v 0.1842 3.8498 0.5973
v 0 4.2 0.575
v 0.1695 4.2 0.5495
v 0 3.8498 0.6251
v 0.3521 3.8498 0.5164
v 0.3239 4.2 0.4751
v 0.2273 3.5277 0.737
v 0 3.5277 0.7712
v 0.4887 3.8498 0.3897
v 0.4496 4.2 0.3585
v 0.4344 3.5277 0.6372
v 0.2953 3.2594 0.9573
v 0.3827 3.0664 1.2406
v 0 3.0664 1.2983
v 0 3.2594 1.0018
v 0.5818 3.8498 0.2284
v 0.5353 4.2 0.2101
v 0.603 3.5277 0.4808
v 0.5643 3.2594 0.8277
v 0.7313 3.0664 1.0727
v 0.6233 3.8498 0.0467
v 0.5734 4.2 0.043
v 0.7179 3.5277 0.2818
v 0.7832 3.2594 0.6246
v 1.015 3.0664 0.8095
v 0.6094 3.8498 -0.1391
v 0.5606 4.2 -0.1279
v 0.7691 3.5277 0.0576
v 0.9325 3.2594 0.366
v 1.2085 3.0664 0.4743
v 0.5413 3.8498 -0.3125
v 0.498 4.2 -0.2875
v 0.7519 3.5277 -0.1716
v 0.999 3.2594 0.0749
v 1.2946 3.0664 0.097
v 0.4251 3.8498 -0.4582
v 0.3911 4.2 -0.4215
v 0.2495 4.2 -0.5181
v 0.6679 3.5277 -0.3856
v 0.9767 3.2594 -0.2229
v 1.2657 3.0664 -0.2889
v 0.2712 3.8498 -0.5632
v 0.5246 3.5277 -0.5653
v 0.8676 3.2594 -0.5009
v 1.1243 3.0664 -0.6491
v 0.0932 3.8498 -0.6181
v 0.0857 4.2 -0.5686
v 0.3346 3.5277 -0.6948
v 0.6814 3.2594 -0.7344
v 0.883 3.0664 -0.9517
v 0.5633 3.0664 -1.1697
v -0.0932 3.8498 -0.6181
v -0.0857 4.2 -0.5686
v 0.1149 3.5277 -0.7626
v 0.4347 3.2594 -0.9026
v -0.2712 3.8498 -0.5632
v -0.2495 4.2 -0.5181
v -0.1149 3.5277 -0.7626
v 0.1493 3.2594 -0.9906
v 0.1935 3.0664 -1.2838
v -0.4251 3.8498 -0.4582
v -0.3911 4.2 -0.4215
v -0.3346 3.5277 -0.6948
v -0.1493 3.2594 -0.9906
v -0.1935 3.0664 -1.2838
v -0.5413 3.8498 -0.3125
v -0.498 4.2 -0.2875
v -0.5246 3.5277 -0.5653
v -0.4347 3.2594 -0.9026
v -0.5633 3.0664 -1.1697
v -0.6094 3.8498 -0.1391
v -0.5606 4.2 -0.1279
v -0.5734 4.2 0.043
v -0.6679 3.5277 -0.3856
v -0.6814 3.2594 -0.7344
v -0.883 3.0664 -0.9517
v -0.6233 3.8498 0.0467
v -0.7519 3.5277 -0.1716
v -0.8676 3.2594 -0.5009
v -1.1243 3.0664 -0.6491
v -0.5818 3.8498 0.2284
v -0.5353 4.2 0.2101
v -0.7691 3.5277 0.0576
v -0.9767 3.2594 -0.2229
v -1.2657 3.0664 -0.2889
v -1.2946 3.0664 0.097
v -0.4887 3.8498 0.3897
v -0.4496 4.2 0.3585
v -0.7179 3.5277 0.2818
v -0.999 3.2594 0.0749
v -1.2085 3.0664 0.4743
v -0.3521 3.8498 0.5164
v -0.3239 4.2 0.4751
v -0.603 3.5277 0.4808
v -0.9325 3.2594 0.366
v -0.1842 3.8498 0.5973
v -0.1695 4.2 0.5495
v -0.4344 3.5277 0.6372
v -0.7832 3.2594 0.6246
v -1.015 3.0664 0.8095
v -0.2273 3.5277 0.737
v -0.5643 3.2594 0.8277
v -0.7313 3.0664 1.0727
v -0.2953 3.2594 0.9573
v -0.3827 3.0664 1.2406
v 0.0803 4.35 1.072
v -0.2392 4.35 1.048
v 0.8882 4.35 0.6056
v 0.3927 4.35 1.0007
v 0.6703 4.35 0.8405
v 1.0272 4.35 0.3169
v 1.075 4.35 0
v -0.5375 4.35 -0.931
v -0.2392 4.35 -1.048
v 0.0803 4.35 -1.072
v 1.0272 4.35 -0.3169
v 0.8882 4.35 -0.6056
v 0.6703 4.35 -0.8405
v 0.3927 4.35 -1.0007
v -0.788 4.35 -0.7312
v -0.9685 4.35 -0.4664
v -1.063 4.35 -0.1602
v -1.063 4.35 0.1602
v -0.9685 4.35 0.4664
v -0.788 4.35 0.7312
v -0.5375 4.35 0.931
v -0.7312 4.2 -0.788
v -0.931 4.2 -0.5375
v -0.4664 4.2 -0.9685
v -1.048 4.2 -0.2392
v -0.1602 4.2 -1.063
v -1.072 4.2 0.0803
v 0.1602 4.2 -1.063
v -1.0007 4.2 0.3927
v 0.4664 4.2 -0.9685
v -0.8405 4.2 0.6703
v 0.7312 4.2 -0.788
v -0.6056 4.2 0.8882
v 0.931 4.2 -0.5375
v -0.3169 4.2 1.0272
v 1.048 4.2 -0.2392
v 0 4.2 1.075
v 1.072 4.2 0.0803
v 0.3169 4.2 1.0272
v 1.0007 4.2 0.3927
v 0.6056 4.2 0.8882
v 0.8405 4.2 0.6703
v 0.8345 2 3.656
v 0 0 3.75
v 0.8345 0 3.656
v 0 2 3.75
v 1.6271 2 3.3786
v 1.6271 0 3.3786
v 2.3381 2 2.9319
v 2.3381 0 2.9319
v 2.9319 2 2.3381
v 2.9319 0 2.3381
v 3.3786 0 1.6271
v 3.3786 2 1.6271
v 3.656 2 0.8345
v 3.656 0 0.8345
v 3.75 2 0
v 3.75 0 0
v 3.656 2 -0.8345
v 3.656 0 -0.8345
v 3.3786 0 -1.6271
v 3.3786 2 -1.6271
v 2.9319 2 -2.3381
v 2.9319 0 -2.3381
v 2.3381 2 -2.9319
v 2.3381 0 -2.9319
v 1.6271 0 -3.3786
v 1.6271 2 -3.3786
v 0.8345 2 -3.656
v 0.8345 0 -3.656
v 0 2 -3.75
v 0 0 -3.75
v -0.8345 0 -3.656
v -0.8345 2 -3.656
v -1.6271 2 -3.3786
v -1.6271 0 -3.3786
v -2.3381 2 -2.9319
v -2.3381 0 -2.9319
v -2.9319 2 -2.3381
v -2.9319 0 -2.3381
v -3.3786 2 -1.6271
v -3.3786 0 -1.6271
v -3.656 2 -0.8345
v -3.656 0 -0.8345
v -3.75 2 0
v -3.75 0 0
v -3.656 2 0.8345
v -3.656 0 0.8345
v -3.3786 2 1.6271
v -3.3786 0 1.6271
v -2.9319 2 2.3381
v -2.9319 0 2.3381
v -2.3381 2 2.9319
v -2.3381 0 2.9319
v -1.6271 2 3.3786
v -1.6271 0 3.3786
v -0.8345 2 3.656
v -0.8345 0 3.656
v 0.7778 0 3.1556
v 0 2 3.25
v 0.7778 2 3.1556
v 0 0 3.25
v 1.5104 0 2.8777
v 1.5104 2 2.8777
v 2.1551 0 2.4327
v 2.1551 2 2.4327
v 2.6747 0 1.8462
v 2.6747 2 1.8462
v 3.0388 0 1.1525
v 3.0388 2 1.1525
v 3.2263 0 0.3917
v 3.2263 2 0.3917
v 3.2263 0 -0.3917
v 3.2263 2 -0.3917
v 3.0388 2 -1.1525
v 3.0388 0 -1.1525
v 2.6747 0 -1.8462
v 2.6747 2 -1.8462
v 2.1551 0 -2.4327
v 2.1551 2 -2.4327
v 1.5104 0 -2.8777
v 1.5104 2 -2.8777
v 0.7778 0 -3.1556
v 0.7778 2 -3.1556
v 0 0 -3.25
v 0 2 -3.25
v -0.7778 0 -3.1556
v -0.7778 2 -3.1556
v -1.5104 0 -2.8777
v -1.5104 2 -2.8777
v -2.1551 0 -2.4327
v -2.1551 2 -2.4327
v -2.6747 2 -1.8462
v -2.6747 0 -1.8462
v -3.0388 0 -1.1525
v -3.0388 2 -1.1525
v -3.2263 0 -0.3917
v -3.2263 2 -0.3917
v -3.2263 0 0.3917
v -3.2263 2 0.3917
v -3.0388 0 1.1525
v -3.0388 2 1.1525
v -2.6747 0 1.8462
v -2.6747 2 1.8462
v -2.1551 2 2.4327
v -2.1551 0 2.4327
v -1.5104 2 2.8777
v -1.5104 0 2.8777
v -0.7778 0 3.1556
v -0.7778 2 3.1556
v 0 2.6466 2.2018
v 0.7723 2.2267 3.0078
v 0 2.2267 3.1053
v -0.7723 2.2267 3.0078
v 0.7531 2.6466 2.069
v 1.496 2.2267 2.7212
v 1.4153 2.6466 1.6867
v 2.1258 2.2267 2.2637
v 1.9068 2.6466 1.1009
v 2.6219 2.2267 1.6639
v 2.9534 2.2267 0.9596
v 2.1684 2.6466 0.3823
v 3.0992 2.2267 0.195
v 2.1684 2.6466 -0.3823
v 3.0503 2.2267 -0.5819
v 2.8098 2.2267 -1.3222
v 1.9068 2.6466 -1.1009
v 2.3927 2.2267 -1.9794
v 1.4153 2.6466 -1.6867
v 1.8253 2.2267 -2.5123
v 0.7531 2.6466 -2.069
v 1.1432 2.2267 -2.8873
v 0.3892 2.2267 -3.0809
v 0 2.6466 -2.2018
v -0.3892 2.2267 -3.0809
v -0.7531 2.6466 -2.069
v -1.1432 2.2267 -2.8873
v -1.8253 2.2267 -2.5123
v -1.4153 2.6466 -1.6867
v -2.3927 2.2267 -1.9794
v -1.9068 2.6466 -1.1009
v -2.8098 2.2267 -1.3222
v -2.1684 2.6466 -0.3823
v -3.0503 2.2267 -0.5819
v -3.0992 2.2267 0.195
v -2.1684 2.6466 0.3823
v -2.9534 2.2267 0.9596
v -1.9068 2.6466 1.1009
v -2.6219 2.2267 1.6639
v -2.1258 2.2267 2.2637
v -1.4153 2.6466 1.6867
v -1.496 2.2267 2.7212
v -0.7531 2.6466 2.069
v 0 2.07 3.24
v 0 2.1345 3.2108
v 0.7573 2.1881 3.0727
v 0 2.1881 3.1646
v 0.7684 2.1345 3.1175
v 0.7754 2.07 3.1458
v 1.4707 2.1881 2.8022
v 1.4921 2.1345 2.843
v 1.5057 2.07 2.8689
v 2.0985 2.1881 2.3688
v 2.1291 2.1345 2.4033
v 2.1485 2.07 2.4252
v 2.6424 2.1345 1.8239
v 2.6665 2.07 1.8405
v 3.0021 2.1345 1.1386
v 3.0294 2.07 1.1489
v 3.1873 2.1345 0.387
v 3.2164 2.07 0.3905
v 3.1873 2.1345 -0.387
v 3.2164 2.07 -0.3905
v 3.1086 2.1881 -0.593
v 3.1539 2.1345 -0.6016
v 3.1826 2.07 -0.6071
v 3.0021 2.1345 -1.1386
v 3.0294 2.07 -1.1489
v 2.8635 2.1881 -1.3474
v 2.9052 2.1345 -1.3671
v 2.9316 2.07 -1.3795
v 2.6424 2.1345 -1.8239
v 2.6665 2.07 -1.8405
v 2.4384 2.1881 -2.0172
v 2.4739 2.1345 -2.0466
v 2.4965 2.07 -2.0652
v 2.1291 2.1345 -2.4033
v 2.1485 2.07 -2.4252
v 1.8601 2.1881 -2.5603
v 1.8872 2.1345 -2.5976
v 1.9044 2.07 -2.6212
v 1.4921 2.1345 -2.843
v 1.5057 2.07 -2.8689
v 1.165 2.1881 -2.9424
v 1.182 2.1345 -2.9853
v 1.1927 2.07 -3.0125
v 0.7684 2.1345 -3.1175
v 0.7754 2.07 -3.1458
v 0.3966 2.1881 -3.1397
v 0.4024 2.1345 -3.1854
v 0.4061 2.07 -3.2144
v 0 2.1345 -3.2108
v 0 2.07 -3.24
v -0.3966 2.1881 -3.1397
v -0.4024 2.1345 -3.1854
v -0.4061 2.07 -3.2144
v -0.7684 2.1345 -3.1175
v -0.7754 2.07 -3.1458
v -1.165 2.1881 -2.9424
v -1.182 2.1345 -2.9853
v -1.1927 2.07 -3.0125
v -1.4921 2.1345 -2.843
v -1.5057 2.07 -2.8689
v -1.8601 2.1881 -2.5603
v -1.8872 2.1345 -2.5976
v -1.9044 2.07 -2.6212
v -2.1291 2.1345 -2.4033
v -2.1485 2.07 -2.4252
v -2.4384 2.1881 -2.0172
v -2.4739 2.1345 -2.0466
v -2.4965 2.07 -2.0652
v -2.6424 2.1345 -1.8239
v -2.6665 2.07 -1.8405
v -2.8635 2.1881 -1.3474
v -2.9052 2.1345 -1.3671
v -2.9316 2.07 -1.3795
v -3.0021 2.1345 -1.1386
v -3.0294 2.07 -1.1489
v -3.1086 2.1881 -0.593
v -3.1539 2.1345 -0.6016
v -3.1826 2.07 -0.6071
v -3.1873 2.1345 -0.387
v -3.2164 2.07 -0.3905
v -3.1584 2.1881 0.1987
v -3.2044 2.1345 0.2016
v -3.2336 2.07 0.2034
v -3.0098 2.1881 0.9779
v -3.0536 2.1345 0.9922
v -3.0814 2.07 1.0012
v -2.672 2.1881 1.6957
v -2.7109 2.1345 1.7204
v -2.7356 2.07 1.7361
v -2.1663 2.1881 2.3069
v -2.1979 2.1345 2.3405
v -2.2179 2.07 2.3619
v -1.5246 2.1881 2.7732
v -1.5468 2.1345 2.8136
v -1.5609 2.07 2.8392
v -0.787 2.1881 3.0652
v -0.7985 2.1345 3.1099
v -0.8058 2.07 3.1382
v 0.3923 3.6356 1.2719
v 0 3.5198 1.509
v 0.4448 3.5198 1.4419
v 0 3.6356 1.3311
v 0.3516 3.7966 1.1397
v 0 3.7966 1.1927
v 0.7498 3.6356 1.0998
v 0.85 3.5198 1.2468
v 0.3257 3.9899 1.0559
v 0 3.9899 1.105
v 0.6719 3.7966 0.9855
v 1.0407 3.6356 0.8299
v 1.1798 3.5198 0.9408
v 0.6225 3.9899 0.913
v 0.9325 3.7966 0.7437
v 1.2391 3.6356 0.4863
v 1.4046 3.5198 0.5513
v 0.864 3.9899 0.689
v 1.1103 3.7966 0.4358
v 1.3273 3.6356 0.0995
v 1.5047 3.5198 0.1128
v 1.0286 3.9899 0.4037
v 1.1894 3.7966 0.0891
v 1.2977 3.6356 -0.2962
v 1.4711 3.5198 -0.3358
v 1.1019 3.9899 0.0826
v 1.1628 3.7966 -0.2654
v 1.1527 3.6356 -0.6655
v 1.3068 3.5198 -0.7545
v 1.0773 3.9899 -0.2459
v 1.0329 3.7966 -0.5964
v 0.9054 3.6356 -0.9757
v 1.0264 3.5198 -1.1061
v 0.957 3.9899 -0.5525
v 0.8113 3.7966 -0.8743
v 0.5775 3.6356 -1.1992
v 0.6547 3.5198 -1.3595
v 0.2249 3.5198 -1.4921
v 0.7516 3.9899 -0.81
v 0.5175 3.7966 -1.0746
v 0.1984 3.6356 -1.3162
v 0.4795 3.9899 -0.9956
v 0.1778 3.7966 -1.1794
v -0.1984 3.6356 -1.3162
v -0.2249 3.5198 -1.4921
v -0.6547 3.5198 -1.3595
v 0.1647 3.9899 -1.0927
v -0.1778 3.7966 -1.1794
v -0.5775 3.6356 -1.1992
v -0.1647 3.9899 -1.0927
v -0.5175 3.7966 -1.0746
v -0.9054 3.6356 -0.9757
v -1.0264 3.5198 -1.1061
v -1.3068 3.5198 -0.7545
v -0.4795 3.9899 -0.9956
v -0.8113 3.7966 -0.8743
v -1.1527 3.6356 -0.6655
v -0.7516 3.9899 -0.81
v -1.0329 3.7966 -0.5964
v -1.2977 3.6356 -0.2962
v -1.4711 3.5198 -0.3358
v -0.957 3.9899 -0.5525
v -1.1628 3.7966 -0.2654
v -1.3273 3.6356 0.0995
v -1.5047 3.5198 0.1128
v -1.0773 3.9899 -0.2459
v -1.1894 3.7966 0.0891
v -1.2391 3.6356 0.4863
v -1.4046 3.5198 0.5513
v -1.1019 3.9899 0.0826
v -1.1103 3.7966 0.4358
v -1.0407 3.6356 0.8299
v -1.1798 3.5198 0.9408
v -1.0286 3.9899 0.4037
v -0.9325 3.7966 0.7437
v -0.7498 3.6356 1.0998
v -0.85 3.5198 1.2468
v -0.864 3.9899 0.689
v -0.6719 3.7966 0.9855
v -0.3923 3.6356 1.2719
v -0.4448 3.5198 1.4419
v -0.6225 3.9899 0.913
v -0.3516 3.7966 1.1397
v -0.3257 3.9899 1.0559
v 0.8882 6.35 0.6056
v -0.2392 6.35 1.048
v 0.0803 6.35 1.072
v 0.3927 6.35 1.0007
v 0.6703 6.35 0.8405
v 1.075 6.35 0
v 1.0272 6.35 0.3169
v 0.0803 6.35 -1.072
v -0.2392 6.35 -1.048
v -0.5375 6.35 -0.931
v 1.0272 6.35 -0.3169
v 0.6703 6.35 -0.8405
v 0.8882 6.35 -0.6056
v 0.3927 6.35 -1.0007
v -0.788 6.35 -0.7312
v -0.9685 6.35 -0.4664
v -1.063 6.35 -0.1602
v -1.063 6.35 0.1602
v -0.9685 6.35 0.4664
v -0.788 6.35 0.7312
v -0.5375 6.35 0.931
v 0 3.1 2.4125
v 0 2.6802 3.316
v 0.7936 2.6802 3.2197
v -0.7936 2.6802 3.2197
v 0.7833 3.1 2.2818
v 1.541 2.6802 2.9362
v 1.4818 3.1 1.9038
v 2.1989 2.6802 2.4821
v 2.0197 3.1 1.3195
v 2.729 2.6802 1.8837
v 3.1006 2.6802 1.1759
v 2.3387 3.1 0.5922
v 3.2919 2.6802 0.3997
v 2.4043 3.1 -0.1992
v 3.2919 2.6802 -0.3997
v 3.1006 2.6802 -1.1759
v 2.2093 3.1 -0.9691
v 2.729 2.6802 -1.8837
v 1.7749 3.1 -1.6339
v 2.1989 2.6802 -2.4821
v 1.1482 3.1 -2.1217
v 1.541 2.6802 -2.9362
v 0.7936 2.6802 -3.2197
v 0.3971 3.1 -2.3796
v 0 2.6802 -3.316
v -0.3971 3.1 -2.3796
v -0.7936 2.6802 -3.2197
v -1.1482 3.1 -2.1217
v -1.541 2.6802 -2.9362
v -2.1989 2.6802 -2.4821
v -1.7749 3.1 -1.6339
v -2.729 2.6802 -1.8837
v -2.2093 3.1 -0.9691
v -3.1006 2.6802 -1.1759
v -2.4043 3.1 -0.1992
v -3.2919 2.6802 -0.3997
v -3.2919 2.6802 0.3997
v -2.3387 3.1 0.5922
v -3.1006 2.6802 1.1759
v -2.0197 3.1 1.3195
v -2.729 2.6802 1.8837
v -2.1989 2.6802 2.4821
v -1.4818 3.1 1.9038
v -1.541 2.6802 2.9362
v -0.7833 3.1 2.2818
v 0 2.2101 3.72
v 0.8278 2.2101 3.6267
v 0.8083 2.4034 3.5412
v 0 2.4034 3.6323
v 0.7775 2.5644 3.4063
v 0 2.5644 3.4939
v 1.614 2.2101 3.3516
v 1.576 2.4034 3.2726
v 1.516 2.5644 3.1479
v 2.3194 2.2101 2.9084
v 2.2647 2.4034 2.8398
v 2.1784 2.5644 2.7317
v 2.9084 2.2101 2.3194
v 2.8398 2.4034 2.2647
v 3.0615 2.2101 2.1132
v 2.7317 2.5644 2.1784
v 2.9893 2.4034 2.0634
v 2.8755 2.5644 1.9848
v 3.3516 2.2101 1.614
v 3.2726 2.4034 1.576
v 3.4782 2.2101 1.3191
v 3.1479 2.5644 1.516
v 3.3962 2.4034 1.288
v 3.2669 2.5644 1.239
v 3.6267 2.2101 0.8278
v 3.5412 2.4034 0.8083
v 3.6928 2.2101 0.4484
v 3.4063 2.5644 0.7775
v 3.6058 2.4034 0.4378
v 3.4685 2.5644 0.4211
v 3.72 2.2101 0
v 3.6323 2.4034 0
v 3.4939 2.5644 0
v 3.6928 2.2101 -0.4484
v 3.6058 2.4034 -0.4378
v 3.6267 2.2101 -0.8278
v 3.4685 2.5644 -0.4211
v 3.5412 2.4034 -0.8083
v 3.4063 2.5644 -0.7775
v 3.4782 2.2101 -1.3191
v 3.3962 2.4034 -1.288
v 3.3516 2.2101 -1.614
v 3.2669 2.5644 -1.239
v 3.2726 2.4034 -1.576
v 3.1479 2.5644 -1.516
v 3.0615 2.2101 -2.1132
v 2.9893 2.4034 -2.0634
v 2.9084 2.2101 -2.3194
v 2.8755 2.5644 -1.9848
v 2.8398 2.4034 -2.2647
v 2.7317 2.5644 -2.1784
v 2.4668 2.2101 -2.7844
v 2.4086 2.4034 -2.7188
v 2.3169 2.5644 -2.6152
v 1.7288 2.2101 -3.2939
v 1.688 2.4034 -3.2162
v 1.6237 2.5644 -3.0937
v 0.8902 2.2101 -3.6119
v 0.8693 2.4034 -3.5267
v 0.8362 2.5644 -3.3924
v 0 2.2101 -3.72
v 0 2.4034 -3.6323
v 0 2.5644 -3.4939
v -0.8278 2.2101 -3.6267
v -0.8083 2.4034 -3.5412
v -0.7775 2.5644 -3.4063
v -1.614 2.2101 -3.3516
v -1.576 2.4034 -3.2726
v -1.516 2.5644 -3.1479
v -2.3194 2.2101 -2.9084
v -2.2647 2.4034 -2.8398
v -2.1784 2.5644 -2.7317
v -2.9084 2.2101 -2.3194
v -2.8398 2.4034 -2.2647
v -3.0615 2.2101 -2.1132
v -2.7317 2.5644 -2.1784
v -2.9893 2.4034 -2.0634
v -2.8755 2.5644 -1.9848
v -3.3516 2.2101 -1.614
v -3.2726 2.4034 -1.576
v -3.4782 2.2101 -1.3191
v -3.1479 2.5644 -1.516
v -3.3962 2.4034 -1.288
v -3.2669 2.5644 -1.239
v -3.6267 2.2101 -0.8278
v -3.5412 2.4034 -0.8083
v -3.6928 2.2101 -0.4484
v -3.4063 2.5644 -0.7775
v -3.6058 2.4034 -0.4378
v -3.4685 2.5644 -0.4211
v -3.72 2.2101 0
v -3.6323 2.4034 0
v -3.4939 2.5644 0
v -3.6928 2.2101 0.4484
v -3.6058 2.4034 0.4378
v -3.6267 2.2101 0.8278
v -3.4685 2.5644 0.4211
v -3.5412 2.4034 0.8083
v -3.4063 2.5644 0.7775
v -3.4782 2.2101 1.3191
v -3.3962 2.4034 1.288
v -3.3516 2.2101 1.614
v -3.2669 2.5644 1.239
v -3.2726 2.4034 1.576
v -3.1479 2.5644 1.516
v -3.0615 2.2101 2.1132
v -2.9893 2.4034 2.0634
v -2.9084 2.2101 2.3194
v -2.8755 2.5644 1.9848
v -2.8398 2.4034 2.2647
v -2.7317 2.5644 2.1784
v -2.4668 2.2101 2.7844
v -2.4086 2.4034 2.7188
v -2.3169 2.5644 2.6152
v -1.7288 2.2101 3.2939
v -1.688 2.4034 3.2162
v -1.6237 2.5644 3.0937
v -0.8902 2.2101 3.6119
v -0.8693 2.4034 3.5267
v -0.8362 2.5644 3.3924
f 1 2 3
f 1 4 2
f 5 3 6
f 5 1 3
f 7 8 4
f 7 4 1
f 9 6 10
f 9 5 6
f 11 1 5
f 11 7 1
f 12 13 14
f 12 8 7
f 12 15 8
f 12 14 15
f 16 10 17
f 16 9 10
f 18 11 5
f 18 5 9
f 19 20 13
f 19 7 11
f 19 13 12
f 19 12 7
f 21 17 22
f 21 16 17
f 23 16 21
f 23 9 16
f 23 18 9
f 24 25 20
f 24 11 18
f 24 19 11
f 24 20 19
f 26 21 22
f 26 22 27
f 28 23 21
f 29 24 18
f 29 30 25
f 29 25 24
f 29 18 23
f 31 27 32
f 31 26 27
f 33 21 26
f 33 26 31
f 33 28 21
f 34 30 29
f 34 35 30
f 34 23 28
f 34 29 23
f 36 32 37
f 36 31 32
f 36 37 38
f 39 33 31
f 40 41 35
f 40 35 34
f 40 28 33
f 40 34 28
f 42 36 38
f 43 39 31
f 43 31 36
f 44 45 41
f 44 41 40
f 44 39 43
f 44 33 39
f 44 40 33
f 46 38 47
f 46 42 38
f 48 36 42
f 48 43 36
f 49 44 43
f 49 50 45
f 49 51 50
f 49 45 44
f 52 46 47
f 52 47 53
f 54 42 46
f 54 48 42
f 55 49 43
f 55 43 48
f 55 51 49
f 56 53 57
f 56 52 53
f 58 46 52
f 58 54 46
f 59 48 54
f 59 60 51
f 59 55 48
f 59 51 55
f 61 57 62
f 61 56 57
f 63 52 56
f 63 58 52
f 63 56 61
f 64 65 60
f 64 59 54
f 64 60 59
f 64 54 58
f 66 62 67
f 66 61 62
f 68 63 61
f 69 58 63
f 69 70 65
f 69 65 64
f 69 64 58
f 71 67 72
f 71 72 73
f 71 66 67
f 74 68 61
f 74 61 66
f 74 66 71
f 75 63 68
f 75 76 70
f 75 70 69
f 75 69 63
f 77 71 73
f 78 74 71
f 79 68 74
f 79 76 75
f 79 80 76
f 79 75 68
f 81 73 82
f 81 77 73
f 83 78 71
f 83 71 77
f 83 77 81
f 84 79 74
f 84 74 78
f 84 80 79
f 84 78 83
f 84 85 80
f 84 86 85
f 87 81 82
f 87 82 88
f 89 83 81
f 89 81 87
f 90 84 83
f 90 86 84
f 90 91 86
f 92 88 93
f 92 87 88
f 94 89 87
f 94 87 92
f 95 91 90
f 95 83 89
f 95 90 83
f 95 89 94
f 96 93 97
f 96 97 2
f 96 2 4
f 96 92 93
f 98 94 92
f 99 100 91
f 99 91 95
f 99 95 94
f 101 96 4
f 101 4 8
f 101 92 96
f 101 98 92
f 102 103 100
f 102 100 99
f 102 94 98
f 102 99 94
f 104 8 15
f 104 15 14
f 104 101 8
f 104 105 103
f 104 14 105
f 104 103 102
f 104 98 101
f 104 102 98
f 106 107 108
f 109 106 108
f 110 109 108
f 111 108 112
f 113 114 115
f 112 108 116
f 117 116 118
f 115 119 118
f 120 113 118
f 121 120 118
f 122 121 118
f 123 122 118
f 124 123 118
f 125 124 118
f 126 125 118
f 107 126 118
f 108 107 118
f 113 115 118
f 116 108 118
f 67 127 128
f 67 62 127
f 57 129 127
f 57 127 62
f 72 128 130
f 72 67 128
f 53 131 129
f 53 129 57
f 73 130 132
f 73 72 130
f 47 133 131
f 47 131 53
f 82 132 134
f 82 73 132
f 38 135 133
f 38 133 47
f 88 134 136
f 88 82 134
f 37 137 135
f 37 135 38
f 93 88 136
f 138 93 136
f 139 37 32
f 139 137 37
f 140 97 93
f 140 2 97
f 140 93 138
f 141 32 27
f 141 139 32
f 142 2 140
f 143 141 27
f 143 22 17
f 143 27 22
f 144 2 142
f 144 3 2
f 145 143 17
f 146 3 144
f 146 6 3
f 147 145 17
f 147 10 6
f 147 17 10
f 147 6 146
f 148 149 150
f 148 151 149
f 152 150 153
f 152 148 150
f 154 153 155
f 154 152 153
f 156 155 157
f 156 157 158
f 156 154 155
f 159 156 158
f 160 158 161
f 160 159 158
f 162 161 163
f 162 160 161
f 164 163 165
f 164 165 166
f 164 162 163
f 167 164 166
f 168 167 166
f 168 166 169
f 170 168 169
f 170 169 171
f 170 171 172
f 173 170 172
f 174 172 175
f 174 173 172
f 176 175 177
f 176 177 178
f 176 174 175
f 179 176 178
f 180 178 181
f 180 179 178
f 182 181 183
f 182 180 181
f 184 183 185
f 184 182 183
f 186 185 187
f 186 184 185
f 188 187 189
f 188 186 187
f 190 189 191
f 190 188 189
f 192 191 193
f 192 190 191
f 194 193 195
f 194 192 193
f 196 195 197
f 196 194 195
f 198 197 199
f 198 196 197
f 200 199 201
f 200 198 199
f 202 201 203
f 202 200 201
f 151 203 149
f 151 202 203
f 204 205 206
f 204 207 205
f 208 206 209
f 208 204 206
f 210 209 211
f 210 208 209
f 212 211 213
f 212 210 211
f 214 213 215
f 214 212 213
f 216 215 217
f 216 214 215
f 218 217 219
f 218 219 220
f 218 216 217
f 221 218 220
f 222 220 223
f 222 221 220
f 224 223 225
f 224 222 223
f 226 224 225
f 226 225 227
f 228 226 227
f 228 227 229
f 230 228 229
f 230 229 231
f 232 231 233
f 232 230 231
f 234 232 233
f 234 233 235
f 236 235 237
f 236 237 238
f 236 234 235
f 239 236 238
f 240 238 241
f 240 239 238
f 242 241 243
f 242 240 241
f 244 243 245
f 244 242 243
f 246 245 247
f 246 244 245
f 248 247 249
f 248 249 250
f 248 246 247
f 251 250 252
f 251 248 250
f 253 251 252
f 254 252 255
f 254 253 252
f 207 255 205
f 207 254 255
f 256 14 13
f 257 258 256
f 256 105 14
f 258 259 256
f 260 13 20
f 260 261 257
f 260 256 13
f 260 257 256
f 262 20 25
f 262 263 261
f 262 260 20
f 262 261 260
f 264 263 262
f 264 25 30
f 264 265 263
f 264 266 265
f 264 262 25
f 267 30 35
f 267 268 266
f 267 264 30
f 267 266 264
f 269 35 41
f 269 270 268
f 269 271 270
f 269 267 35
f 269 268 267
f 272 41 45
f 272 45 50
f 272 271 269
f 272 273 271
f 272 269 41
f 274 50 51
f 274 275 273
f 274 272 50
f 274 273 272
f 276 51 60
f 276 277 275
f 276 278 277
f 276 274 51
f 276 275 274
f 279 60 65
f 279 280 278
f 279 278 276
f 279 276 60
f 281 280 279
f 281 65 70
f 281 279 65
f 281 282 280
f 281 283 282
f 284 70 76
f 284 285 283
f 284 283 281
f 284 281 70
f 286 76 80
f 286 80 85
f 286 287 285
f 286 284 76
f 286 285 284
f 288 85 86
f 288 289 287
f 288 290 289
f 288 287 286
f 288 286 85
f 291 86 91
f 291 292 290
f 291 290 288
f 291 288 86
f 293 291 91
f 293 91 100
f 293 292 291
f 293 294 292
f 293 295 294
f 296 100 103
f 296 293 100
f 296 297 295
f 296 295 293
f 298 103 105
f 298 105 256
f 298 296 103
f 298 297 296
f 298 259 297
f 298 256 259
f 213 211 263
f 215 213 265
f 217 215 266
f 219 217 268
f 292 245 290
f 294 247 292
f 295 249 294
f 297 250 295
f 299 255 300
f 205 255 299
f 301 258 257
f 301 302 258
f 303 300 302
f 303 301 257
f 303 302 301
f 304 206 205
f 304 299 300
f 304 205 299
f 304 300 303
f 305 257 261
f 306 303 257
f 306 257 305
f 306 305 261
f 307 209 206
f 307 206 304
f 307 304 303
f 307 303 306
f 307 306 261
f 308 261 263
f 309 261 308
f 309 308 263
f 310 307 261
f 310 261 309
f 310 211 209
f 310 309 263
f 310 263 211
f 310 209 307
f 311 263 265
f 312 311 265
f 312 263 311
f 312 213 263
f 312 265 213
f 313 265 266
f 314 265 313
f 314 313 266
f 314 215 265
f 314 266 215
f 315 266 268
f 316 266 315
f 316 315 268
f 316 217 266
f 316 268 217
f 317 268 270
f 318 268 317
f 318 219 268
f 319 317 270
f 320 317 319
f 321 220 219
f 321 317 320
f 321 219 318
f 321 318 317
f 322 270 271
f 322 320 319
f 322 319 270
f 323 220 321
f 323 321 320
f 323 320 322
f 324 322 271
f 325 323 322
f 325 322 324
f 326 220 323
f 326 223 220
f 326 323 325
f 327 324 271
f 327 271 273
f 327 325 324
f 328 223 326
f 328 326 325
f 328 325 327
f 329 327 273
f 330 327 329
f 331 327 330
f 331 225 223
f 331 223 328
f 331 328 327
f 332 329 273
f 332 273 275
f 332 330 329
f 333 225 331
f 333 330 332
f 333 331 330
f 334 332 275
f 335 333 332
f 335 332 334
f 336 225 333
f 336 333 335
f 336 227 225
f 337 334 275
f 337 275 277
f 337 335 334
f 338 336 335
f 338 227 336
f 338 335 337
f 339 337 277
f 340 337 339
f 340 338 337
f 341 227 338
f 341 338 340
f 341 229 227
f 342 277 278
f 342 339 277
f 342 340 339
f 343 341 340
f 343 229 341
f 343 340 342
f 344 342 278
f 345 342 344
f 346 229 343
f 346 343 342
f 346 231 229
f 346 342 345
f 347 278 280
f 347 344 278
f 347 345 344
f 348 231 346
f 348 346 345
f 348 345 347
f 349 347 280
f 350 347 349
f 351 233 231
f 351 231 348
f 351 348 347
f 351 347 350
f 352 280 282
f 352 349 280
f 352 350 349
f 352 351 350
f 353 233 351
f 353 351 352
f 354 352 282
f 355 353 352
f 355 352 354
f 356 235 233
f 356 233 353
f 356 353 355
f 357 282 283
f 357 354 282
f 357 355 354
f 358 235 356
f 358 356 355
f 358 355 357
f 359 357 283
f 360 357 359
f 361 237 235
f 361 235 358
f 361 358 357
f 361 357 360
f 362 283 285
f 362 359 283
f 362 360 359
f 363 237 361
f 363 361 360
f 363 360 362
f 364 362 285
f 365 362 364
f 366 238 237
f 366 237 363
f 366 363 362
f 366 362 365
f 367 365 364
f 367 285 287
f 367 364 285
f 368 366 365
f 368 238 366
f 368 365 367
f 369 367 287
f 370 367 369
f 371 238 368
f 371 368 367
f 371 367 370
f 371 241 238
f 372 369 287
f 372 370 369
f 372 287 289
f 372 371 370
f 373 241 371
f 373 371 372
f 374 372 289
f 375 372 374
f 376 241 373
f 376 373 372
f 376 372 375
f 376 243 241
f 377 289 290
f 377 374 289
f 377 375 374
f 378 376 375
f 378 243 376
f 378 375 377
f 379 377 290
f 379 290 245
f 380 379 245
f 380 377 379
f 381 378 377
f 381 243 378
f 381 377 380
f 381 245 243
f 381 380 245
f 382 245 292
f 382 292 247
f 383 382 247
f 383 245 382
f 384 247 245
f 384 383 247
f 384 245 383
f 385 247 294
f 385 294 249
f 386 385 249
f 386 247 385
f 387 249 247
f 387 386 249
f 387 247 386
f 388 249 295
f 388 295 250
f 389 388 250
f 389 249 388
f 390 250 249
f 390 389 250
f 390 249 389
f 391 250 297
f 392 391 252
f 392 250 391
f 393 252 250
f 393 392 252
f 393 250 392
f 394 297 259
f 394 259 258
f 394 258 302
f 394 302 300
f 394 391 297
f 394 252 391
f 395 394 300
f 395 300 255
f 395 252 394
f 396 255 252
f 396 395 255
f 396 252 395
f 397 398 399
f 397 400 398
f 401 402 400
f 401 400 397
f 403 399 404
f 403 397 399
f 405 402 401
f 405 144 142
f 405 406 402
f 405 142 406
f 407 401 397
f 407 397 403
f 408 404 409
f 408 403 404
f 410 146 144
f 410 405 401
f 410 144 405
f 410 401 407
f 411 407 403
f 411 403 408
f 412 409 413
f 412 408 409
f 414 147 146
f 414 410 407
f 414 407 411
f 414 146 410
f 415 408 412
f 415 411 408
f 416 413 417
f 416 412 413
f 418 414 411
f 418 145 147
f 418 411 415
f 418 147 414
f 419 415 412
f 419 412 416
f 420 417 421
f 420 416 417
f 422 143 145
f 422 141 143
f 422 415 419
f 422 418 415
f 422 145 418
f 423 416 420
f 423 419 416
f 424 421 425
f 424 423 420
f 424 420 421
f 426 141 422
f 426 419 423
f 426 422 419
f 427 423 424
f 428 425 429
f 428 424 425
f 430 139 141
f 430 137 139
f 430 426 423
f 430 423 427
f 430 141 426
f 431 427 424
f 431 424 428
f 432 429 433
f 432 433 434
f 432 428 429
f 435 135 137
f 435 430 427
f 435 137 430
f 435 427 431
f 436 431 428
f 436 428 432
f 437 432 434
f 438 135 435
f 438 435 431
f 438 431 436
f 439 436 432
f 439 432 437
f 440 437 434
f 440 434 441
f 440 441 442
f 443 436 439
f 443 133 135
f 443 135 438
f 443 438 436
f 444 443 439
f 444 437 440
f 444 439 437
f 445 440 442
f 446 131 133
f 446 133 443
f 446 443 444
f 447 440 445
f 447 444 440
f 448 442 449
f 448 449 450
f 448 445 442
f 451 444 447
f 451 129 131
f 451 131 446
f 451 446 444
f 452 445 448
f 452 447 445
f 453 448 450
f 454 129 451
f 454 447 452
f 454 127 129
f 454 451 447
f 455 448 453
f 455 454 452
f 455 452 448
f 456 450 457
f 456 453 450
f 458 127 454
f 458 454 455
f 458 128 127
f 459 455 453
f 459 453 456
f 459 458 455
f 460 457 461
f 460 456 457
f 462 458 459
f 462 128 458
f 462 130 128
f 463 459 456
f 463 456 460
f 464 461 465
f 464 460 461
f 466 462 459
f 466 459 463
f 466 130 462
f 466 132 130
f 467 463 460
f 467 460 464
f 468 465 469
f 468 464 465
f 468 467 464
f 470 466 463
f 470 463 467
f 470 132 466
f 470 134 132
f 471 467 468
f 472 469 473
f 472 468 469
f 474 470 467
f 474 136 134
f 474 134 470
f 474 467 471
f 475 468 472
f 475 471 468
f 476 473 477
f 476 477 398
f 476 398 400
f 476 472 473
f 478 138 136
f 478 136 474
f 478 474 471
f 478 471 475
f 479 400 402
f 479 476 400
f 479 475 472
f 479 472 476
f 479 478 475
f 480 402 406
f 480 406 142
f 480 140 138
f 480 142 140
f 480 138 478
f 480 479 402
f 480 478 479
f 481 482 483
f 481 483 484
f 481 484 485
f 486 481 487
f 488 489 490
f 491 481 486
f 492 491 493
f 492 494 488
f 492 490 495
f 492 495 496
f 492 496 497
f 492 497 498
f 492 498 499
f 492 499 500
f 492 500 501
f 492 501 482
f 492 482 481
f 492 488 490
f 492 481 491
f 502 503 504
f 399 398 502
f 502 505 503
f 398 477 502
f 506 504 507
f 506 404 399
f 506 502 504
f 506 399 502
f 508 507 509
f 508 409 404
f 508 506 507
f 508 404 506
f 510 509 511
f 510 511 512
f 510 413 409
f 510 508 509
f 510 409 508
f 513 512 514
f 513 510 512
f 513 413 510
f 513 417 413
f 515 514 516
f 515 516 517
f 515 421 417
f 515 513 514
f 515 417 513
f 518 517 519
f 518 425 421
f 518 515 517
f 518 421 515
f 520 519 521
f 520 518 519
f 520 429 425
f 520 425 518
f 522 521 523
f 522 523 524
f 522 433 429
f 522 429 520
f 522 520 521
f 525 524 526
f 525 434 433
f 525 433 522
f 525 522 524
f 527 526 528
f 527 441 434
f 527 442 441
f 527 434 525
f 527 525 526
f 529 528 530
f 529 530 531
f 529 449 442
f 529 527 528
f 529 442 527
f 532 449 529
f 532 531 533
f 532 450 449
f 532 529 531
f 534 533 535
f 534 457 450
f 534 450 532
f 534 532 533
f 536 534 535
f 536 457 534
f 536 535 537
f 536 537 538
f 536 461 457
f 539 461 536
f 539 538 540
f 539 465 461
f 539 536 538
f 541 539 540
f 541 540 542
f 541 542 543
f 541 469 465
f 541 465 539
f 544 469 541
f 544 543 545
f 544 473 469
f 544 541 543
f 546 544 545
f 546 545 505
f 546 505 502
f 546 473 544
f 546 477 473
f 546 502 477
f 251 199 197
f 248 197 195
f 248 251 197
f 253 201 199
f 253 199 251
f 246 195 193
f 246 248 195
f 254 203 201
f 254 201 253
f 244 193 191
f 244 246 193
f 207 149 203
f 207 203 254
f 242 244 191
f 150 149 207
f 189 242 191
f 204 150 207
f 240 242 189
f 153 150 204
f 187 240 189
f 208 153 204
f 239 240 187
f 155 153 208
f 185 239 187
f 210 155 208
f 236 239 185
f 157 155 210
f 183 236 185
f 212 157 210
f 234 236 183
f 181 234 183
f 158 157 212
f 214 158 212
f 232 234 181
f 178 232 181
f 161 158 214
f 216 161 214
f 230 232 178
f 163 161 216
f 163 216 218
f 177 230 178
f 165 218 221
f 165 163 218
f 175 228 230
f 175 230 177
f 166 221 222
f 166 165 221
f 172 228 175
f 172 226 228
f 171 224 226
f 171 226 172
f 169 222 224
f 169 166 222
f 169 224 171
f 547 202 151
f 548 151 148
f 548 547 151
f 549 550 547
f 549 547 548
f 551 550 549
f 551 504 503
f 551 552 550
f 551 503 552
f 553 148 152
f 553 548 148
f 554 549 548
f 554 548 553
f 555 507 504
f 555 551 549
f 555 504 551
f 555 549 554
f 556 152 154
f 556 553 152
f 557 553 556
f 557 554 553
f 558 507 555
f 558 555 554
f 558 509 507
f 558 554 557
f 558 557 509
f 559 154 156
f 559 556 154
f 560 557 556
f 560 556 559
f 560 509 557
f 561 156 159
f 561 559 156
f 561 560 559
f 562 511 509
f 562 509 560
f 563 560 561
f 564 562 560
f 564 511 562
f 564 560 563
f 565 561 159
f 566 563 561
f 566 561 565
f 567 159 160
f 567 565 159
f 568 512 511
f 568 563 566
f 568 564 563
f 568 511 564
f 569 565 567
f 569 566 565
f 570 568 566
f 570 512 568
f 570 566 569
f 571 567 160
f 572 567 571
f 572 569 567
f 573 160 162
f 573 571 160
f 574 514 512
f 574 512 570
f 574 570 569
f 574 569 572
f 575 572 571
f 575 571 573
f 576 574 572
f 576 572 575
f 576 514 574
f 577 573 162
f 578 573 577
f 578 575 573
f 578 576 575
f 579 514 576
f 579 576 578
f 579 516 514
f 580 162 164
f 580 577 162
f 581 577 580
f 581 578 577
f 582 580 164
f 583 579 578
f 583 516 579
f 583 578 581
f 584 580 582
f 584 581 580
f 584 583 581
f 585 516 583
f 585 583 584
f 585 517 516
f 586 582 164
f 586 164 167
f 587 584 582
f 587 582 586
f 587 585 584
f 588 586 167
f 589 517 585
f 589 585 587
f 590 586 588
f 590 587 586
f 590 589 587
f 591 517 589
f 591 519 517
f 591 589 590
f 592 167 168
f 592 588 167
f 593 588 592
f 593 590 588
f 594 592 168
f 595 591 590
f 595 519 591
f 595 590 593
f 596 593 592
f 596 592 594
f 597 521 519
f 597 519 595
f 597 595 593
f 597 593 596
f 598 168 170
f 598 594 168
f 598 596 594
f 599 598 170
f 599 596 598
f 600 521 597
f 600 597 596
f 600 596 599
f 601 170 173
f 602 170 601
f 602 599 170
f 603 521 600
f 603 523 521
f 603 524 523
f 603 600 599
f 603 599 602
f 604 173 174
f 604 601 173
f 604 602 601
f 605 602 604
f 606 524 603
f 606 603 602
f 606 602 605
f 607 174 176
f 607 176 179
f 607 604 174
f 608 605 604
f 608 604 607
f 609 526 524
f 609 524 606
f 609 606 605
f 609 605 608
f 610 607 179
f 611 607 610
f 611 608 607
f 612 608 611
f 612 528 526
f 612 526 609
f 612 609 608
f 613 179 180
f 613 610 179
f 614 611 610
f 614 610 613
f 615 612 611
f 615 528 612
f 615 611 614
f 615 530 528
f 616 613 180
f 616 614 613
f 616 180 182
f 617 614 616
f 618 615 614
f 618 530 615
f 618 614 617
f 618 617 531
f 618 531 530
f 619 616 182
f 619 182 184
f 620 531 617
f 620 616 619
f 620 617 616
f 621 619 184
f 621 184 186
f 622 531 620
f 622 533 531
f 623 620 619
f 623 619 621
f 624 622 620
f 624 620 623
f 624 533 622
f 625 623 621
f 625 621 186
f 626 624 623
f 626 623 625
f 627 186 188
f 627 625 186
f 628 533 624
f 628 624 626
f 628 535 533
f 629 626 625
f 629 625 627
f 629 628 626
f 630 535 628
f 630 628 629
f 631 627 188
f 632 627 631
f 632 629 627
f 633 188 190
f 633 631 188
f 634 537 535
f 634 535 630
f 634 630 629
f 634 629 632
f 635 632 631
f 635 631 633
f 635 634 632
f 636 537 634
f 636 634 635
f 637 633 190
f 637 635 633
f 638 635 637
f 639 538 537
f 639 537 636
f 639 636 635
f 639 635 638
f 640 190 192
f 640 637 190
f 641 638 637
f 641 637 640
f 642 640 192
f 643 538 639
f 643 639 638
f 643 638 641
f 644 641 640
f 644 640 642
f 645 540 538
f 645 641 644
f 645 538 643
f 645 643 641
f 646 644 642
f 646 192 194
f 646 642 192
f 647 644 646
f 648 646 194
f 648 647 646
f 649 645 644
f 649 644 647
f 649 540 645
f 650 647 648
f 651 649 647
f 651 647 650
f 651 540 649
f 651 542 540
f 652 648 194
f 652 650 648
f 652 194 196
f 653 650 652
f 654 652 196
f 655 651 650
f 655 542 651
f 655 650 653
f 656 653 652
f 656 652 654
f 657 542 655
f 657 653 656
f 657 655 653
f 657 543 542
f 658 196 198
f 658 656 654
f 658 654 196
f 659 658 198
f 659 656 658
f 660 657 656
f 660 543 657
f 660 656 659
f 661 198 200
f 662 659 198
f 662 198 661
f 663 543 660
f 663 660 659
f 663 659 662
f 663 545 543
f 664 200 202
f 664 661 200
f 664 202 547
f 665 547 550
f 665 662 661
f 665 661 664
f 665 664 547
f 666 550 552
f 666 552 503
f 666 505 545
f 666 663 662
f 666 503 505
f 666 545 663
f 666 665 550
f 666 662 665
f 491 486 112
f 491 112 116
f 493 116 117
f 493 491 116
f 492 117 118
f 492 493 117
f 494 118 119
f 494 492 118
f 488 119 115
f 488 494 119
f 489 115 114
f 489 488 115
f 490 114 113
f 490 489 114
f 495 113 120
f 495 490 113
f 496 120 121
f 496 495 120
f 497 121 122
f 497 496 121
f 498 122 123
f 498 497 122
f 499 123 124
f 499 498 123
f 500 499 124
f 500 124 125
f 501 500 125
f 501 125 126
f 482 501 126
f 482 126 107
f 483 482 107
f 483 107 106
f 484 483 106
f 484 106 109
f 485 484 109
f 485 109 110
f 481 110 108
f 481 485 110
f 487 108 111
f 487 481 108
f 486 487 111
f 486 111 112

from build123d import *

# Parameters (mm, degrees)
SKETCH2_R           = 1.075
BOSS_EXTRUDE2_DEPTH = 2


with BuildPart() as part:
    # Sketch6 → Revolve-Thin2 (revolve)
    with BuildSketch(Plane(origin=(0, 0, 0), x_dir=(0, 0, -1), z_dir=(1, 0, 0))):
        with BuildLine():
            Line((-3.75, 0), (-3.75, 2))
            ThreePointArc((-3.75, 2), (-3.632270634, 2.403402832), (-3.31604308, 2.680159372))
            Line((-3.31604308, 2.680159372), (-1.50895692, 3.519840628))
            ThreePointArc((-1.50895692, 3.519840628), (-1.192729366, 3.796597168), (-1.075, 4.2))
            Line((-1.075, 4.2), (-0.575, 4.2))
            ThreePointArc((-0.575, 4.2), (-0.77121561, 3.527661946), (-1.298261533, 3.066401046))
            Line((-1.298261533, 3.066401046), (-3.105347693, 2.226719791))
            ThreePointArc((-3.105347693, 2.226719791), (-3.210756878, 2.134467611), (-3.25, 2))
            Line((-3.25, 2), (-3.25, 0))
            Line((-3.25, 0), (-3.75, 0))
        make_face()
    revolve(axis=Axis((0, -0.227579974, 0), (0, 1, 0)))


with BuildPart() as body_2:
    # Sketch2 → Boss-Extrude2 (new body)
    with BuildSketch(Plane(origin=(0, 6.35, 0), x_dir=(1, 0, 0), z_dir=(0, 1, 0))):
        Circle(SKETCH2_R)
    extrude(amount=-BOSS_EXTRUDE2_DEPTH)


solid = Compound([part.part, body_2.part])
